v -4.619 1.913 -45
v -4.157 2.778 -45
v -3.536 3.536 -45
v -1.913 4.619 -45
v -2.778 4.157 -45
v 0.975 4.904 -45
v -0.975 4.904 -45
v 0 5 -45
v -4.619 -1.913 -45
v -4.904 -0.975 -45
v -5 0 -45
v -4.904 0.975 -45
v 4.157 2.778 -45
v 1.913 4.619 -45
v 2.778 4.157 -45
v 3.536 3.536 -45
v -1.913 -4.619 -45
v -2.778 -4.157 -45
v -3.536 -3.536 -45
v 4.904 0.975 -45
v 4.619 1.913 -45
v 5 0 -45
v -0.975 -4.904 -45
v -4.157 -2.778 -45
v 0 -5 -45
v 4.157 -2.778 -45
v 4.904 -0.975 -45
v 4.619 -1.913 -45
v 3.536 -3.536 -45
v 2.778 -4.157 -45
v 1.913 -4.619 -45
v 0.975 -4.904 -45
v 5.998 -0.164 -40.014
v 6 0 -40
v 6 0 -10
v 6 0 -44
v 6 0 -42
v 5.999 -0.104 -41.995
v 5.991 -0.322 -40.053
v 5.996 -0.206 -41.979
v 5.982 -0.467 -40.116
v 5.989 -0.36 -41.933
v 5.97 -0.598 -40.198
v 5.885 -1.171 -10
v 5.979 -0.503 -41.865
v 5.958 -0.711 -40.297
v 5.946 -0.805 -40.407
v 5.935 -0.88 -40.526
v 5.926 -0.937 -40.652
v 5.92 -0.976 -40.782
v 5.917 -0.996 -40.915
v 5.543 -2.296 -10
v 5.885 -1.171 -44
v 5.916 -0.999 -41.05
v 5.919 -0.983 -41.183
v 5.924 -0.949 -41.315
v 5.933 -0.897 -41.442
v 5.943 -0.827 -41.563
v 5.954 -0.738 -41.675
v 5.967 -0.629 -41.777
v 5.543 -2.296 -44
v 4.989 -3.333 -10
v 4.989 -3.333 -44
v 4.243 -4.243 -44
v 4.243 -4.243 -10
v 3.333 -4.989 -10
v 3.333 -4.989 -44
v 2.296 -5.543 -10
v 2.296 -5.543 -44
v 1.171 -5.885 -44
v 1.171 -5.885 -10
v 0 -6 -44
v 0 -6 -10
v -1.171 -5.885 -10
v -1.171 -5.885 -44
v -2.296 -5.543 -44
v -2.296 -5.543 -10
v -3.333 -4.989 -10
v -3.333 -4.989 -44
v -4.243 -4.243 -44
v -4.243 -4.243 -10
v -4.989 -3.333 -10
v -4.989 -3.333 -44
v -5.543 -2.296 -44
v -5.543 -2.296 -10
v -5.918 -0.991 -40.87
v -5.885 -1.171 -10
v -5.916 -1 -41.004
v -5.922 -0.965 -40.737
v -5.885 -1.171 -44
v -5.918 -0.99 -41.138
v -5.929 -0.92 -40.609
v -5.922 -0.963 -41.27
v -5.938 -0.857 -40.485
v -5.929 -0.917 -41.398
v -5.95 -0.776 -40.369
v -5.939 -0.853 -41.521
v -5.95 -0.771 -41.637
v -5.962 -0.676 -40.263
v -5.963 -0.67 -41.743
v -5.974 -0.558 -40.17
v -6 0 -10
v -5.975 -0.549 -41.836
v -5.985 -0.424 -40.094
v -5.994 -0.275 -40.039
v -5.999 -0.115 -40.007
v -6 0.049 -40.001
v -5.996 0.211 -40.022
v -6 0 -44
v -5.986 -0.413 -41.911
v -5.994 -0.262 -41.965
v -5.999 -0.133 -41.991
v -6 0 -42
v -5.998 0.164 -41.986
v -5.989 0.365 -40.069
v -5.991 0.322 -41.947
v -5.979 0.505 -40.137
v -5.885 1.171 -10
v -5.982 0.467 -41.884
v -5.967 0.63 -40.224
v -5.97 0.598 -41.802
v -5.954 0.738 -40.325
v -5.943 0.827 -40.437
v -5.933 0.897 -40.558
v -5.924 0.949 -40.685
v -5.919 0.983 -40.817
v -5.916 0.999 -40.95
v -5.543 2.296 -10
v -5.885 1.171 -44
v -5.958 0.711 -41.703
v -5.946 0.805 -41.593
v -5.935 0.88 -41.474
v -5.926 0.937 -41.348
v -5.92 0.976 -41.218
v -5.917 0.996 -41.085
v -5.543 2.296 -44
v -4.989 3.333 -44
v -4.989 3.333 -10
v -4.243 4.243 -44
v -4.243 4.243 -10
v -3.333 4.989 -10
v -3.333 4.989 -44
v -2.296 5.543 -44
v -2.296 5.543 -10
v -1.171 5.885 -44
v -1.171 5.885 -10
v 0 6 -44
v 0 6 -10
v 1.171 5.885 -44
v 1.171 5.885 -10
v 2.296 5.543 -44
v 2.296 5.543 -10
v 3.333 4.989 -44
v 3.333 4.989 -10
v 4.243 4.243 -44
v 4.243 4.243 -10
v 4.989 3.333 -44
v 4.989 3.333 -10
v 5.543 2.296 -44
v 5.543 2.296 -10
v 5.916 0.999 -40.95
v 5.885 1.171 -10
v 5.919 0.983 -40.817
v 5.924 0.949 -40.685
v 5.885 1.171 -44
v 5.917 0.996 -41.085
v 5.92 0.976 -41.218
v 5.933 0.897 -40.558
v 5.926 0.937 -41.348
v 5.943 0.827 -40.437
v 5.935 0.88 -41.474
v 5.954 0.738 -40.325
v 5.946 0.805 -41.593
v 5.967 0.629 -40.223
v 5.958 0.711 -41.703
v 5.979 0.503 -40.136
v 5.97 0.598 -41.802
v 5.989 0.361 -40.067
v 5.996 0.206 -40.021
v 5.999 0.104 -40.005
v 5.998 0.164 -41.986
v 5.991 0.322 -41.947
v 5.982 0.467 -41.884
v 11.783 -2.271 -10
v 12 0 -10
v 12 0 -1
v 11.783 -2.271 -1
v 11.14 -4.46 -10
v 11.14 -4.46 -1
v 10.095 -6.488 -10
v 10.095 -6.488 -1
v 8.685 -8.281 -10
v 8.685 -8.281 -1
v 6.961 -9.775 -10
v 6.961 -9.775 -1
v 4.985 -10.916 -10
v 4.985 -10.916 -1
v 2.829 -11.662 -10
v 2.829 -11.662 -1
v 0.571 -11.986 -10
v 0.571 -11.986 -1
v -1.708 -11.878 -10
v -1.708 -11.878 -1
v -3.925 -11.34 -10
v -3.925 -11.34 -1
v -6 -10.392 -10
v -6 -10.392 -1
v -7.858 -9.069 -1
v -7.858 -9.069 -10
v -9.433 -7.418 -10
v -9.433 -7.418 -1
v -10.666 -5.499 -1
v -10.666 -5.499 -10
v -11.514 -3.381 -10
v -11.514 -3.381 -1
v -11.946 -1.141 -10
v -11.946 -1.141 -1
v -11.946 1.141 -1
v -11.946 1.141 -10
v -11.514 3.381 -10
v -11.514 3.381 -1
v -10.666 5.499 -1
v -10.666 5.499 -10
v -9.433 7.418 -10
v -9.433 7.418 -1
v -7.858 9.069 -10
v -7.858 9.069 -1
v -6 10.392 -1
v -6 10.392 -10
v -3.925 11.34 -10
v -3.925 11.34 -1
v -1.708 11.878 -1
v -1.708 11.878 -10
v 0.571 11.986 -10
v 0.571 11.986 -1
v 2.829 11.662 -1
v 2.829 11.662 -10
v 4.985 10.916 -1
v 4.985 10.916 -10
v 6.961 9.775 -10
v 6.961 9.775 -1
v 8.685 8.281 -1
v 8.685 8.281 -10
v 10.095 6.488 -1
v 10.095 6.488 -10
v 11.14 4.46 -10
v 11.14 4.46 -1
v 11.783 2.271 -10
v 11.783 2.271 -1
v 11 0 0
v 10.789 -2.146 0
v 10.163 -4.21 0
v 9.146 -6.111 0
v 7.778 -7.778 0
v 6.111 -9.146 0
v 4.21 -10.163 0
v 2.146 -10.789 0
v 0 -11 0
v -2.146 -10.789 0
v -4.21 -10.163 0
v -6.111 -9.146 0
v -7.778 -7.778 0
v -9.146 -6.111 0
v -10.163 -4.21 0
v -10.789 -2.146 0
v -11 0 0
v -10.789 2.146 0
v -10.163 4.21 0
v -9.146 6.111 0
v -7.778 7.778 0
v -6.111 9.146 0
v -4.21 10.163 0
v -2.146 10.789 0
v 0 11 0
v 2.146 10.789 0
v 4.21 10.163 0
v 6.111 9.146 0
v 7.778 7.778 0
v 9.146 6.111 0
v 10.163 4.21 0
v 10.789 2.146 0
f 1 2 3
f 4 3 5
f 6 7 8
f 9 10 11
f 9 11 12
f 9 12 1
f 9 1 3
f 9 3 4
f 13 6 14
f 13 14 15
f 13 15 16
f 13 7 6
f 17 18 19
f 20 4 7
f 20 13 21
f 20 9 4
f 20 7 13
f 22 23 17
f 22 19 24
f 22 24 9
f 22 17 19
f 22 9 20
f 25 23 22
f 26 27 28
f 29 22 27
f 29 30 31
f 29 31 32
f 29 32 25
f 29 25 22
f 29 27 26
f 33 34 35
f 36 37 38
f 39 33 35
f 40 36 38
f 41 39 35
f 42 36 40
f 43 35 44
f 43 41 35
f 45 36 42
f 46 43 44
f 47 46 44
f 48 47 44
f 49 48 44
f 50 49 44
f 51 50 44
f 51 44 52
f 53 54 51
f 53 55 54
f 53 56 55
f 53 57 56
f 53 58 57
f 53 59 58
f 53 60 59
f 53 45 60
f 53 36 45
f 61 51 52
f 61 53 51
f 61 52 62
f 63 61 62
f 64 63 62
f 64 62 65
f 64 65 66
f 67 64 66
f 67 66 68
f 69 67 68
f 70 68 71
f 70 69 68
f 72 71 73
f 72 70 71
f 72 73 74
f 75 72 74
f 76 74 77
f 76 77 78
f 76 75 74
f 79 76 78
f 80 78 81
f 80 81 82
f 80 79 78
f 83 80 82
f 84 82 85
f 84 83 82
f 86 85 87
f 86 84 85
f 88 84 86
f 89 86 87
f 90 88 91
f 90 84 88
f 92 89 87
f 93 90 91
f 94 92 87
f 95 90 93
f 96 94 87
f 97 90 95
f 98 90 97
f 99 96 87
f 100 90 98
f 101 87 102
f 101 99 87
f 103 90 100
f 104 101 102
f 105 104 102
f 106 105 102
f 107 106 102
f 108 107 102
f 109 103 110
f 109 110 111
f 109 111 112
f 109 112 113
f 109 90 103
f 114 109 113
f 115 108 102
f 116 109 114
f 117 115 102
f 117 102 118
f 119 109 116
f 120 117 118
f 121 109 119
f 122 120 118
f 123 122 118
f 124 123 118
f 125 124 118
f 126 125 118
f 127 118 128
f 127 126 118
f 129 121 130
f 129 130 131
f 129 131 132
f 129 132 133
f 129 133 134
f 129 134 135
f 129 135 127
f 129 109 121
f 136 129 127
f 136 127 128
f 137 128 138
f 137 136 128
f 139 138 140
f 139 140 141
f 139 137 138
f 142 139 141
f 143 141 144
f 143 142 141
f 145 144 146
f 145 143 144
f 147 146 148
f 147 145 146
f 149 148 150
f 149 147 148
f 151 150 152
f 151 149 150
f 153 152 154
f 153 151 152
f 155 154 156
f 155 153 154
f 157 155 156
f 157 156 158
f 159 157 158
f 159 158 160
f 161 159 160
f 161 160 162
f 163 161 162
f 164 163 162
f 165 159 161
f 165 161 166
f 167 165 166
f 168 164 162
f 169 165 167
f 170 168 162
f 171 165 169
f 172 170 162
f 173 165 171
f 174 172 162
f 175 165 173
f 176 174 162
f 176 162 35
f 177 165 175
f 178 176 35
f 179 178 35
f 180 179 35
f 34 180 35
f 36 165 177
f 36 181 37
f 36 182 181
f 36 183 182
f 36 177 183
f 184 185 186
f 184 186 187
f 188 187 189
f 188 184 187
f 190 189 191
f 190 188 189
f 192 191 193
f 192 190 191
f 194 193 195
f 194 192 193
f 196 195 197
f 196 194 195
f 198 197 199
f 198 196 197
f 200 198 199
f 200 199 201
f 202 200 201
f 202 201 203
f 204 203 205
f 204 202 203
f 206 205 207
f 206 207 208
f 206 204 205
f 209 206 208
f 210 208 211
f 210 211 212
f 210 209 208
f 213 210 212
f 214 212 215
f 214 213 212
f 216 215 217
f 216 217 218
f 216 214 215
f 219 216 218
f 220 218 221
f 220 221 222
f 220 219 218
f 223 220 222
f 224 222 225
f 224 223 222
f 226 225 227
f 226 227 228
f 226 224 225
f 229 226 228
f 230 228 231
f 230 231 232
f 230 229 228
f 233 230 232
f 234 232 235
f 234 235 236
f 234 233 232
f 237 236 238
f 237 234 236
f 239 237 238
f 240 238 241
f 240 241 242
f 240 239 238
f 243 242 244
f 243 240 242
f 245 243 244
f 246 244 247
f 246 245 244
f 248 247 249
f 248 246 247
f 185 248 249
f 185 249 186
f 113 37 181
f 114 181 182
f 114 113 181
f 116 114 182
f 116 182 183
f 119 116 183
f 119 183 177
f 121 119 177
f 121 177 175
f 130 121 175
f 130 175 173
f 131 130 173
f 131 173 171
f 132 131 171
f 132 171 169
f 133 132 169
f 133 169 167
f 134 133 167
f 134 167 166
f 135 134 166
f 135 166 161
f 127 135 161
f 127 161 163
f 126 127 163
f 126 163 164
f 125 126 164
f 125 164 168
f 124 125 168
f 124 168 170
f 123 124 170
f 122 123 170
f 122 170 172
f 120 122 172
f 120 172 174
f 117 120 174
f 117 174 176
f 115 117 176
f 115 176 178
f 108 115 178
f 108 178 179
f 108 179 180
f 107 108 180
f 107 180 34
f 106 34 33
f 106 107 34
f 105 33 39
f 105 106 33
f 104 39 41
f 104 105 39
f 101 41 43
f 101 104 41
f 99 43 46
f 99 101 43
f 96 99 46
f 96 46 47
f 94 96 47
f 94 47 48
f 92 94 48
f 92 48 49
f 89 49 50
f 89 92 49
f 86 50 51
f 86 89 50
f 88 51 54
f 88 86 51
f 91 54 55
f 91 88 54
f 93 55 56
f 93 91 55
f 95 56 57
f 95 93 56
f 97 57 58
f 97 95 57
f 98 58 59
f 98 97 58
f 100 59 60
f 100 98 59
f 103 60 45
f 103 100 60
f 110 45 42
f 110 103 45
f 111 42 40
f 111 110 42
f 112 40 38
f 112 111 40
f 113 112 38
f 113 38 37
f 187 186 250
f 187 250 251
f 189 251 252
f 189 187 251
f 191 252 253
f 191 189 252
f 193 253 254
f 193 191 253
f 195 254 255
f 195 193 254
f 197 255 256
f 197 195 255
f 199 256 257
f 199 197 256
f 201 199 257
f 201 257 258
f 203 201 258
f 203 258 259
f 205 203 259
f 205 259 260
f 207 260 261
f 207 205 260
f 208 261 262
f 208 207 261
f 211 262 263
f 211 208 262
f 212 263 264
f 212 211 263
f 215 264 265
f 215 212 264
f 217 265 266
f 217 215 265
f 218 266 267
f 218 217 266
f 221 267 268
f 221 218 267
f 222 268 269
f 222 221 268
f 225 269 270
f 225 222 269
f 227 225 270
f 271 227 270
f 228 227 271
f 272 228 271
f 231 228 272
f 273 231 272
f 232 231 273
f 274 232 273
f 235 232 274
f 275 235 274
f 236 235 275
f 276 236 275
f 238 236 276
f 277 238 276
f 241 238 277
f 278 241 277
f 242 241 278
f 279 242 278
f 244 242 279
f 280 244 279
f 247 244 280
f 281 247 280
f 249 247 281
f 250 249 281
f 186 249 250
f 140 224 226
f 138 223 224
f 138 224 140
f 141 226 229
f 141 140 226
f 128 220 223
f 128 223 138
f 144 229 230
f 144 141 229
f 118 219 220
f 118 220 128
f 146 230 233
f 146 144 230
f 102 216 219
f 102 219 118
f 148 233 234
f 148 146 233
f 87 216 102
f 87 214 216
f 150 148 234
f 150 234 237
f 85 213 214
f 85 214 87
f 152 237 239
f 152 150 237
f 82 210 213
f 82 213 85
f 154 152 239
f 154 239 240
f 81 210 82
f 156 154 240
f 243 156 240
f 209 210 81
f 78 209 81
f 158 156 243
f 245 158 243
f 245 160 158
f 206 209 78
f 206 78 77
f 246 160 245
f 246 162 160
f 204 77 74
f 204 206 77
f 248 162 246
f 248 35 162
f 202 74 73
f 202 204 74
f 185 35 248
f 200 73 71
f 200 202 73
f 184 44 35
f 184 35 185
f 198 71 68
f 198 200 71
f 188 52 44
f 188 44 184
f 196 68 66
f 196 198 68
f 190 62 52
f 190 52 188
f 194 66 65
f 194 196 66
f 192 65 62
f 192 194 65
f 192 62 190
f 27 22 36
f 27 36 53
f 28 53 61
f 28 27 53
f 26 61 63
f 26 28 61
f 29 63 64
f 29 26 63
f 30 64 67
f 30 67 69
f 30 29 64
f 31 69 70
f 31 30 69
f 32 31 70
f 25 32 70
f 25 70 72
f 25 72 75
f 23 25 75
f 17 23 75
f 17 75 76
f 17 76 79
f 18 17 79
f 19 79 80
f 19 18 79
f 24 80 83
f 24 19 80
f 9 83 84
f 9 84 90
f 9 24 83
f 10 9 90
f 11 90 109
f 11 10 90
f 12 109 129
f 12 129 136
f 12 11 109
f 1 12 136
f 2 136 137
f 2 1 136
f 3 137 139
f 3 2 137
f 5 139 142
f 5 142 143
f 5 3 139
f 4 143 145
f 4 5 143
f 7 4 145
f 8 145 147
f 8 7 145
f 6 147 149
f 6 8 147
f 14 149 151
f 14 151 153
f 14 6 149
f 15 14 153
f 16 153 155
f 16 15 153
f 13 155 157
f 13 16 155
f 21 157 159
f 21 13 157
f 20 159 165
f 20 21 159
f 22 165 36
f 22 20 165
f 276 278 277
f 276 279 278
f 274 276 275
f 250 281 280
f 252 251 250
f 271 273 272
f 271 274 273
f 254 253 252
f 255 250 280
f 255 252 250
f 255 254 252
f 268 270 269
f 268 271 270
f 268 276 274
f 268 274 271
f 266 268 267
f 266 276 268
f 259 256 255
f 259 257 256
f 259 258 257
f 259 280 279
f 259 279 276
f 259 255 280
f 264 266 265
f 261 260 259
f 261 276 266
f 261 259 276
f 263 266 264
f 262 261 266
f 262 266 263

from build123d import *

# Parameters (mm, degrees)
CHAMFER_1_SIZE           = 1
CUT_EXTRUDE_1_DEPTH      = 49.093658626
CUT_EXTRUDE_1_DEPTH_BACK = 49.093658626
SKETCH_2_R               = 1


with BuildPart() as part:
    # 草圖1 → 旋轉1 (revolve)
    with BuildSketch(Plane(origin=(0, 0, 0), x_dir=(0, 0, -1), z_dir=(1, 0, 0)), mode=Mode.PRIVATE) as revolve_1_sk:
        Polygon((0, 0), (0, 12), (10, 12), (10, 6), (45, 6), (45, 0), align=None)
    revolve(revolve_1_sk.sketch.rotate(Axis((0, 0, 0), (0, 0, -1)), 90), axis=Axis((0, 0, 0), (0, 0, -1)))

    # 導角1
    chamfer_1_edges = [part.edges().sort_by_distance(p)[0] for p in [
        (-6, 0, -45),
        (-12, 0, 0),
    ]]
    chamfer(chamfer_1_edges, length=CHAMFER_1_SIZE)

    # 草圖2 → 伸長1 (cut, two sides: drawn at the far end of the back side and taken through both)
    with BuildSketch(Plane(origin=(0, 0, 0), x_dir=(0, 0, -1), z_dir=(1, 0, 0)).offset(-CUT_EXTRUDE_1_DEPTH_BACK)):
        with Locations((41, 0)):
            Circle(SKETCH_2_R)
    extrude(amount=CUT_EXTRUDE_1_DEPTH + CUT_EXTRUDE_1_DEPTH_BACK, mode=Mode.SUBTRACT)


solid = part.part
